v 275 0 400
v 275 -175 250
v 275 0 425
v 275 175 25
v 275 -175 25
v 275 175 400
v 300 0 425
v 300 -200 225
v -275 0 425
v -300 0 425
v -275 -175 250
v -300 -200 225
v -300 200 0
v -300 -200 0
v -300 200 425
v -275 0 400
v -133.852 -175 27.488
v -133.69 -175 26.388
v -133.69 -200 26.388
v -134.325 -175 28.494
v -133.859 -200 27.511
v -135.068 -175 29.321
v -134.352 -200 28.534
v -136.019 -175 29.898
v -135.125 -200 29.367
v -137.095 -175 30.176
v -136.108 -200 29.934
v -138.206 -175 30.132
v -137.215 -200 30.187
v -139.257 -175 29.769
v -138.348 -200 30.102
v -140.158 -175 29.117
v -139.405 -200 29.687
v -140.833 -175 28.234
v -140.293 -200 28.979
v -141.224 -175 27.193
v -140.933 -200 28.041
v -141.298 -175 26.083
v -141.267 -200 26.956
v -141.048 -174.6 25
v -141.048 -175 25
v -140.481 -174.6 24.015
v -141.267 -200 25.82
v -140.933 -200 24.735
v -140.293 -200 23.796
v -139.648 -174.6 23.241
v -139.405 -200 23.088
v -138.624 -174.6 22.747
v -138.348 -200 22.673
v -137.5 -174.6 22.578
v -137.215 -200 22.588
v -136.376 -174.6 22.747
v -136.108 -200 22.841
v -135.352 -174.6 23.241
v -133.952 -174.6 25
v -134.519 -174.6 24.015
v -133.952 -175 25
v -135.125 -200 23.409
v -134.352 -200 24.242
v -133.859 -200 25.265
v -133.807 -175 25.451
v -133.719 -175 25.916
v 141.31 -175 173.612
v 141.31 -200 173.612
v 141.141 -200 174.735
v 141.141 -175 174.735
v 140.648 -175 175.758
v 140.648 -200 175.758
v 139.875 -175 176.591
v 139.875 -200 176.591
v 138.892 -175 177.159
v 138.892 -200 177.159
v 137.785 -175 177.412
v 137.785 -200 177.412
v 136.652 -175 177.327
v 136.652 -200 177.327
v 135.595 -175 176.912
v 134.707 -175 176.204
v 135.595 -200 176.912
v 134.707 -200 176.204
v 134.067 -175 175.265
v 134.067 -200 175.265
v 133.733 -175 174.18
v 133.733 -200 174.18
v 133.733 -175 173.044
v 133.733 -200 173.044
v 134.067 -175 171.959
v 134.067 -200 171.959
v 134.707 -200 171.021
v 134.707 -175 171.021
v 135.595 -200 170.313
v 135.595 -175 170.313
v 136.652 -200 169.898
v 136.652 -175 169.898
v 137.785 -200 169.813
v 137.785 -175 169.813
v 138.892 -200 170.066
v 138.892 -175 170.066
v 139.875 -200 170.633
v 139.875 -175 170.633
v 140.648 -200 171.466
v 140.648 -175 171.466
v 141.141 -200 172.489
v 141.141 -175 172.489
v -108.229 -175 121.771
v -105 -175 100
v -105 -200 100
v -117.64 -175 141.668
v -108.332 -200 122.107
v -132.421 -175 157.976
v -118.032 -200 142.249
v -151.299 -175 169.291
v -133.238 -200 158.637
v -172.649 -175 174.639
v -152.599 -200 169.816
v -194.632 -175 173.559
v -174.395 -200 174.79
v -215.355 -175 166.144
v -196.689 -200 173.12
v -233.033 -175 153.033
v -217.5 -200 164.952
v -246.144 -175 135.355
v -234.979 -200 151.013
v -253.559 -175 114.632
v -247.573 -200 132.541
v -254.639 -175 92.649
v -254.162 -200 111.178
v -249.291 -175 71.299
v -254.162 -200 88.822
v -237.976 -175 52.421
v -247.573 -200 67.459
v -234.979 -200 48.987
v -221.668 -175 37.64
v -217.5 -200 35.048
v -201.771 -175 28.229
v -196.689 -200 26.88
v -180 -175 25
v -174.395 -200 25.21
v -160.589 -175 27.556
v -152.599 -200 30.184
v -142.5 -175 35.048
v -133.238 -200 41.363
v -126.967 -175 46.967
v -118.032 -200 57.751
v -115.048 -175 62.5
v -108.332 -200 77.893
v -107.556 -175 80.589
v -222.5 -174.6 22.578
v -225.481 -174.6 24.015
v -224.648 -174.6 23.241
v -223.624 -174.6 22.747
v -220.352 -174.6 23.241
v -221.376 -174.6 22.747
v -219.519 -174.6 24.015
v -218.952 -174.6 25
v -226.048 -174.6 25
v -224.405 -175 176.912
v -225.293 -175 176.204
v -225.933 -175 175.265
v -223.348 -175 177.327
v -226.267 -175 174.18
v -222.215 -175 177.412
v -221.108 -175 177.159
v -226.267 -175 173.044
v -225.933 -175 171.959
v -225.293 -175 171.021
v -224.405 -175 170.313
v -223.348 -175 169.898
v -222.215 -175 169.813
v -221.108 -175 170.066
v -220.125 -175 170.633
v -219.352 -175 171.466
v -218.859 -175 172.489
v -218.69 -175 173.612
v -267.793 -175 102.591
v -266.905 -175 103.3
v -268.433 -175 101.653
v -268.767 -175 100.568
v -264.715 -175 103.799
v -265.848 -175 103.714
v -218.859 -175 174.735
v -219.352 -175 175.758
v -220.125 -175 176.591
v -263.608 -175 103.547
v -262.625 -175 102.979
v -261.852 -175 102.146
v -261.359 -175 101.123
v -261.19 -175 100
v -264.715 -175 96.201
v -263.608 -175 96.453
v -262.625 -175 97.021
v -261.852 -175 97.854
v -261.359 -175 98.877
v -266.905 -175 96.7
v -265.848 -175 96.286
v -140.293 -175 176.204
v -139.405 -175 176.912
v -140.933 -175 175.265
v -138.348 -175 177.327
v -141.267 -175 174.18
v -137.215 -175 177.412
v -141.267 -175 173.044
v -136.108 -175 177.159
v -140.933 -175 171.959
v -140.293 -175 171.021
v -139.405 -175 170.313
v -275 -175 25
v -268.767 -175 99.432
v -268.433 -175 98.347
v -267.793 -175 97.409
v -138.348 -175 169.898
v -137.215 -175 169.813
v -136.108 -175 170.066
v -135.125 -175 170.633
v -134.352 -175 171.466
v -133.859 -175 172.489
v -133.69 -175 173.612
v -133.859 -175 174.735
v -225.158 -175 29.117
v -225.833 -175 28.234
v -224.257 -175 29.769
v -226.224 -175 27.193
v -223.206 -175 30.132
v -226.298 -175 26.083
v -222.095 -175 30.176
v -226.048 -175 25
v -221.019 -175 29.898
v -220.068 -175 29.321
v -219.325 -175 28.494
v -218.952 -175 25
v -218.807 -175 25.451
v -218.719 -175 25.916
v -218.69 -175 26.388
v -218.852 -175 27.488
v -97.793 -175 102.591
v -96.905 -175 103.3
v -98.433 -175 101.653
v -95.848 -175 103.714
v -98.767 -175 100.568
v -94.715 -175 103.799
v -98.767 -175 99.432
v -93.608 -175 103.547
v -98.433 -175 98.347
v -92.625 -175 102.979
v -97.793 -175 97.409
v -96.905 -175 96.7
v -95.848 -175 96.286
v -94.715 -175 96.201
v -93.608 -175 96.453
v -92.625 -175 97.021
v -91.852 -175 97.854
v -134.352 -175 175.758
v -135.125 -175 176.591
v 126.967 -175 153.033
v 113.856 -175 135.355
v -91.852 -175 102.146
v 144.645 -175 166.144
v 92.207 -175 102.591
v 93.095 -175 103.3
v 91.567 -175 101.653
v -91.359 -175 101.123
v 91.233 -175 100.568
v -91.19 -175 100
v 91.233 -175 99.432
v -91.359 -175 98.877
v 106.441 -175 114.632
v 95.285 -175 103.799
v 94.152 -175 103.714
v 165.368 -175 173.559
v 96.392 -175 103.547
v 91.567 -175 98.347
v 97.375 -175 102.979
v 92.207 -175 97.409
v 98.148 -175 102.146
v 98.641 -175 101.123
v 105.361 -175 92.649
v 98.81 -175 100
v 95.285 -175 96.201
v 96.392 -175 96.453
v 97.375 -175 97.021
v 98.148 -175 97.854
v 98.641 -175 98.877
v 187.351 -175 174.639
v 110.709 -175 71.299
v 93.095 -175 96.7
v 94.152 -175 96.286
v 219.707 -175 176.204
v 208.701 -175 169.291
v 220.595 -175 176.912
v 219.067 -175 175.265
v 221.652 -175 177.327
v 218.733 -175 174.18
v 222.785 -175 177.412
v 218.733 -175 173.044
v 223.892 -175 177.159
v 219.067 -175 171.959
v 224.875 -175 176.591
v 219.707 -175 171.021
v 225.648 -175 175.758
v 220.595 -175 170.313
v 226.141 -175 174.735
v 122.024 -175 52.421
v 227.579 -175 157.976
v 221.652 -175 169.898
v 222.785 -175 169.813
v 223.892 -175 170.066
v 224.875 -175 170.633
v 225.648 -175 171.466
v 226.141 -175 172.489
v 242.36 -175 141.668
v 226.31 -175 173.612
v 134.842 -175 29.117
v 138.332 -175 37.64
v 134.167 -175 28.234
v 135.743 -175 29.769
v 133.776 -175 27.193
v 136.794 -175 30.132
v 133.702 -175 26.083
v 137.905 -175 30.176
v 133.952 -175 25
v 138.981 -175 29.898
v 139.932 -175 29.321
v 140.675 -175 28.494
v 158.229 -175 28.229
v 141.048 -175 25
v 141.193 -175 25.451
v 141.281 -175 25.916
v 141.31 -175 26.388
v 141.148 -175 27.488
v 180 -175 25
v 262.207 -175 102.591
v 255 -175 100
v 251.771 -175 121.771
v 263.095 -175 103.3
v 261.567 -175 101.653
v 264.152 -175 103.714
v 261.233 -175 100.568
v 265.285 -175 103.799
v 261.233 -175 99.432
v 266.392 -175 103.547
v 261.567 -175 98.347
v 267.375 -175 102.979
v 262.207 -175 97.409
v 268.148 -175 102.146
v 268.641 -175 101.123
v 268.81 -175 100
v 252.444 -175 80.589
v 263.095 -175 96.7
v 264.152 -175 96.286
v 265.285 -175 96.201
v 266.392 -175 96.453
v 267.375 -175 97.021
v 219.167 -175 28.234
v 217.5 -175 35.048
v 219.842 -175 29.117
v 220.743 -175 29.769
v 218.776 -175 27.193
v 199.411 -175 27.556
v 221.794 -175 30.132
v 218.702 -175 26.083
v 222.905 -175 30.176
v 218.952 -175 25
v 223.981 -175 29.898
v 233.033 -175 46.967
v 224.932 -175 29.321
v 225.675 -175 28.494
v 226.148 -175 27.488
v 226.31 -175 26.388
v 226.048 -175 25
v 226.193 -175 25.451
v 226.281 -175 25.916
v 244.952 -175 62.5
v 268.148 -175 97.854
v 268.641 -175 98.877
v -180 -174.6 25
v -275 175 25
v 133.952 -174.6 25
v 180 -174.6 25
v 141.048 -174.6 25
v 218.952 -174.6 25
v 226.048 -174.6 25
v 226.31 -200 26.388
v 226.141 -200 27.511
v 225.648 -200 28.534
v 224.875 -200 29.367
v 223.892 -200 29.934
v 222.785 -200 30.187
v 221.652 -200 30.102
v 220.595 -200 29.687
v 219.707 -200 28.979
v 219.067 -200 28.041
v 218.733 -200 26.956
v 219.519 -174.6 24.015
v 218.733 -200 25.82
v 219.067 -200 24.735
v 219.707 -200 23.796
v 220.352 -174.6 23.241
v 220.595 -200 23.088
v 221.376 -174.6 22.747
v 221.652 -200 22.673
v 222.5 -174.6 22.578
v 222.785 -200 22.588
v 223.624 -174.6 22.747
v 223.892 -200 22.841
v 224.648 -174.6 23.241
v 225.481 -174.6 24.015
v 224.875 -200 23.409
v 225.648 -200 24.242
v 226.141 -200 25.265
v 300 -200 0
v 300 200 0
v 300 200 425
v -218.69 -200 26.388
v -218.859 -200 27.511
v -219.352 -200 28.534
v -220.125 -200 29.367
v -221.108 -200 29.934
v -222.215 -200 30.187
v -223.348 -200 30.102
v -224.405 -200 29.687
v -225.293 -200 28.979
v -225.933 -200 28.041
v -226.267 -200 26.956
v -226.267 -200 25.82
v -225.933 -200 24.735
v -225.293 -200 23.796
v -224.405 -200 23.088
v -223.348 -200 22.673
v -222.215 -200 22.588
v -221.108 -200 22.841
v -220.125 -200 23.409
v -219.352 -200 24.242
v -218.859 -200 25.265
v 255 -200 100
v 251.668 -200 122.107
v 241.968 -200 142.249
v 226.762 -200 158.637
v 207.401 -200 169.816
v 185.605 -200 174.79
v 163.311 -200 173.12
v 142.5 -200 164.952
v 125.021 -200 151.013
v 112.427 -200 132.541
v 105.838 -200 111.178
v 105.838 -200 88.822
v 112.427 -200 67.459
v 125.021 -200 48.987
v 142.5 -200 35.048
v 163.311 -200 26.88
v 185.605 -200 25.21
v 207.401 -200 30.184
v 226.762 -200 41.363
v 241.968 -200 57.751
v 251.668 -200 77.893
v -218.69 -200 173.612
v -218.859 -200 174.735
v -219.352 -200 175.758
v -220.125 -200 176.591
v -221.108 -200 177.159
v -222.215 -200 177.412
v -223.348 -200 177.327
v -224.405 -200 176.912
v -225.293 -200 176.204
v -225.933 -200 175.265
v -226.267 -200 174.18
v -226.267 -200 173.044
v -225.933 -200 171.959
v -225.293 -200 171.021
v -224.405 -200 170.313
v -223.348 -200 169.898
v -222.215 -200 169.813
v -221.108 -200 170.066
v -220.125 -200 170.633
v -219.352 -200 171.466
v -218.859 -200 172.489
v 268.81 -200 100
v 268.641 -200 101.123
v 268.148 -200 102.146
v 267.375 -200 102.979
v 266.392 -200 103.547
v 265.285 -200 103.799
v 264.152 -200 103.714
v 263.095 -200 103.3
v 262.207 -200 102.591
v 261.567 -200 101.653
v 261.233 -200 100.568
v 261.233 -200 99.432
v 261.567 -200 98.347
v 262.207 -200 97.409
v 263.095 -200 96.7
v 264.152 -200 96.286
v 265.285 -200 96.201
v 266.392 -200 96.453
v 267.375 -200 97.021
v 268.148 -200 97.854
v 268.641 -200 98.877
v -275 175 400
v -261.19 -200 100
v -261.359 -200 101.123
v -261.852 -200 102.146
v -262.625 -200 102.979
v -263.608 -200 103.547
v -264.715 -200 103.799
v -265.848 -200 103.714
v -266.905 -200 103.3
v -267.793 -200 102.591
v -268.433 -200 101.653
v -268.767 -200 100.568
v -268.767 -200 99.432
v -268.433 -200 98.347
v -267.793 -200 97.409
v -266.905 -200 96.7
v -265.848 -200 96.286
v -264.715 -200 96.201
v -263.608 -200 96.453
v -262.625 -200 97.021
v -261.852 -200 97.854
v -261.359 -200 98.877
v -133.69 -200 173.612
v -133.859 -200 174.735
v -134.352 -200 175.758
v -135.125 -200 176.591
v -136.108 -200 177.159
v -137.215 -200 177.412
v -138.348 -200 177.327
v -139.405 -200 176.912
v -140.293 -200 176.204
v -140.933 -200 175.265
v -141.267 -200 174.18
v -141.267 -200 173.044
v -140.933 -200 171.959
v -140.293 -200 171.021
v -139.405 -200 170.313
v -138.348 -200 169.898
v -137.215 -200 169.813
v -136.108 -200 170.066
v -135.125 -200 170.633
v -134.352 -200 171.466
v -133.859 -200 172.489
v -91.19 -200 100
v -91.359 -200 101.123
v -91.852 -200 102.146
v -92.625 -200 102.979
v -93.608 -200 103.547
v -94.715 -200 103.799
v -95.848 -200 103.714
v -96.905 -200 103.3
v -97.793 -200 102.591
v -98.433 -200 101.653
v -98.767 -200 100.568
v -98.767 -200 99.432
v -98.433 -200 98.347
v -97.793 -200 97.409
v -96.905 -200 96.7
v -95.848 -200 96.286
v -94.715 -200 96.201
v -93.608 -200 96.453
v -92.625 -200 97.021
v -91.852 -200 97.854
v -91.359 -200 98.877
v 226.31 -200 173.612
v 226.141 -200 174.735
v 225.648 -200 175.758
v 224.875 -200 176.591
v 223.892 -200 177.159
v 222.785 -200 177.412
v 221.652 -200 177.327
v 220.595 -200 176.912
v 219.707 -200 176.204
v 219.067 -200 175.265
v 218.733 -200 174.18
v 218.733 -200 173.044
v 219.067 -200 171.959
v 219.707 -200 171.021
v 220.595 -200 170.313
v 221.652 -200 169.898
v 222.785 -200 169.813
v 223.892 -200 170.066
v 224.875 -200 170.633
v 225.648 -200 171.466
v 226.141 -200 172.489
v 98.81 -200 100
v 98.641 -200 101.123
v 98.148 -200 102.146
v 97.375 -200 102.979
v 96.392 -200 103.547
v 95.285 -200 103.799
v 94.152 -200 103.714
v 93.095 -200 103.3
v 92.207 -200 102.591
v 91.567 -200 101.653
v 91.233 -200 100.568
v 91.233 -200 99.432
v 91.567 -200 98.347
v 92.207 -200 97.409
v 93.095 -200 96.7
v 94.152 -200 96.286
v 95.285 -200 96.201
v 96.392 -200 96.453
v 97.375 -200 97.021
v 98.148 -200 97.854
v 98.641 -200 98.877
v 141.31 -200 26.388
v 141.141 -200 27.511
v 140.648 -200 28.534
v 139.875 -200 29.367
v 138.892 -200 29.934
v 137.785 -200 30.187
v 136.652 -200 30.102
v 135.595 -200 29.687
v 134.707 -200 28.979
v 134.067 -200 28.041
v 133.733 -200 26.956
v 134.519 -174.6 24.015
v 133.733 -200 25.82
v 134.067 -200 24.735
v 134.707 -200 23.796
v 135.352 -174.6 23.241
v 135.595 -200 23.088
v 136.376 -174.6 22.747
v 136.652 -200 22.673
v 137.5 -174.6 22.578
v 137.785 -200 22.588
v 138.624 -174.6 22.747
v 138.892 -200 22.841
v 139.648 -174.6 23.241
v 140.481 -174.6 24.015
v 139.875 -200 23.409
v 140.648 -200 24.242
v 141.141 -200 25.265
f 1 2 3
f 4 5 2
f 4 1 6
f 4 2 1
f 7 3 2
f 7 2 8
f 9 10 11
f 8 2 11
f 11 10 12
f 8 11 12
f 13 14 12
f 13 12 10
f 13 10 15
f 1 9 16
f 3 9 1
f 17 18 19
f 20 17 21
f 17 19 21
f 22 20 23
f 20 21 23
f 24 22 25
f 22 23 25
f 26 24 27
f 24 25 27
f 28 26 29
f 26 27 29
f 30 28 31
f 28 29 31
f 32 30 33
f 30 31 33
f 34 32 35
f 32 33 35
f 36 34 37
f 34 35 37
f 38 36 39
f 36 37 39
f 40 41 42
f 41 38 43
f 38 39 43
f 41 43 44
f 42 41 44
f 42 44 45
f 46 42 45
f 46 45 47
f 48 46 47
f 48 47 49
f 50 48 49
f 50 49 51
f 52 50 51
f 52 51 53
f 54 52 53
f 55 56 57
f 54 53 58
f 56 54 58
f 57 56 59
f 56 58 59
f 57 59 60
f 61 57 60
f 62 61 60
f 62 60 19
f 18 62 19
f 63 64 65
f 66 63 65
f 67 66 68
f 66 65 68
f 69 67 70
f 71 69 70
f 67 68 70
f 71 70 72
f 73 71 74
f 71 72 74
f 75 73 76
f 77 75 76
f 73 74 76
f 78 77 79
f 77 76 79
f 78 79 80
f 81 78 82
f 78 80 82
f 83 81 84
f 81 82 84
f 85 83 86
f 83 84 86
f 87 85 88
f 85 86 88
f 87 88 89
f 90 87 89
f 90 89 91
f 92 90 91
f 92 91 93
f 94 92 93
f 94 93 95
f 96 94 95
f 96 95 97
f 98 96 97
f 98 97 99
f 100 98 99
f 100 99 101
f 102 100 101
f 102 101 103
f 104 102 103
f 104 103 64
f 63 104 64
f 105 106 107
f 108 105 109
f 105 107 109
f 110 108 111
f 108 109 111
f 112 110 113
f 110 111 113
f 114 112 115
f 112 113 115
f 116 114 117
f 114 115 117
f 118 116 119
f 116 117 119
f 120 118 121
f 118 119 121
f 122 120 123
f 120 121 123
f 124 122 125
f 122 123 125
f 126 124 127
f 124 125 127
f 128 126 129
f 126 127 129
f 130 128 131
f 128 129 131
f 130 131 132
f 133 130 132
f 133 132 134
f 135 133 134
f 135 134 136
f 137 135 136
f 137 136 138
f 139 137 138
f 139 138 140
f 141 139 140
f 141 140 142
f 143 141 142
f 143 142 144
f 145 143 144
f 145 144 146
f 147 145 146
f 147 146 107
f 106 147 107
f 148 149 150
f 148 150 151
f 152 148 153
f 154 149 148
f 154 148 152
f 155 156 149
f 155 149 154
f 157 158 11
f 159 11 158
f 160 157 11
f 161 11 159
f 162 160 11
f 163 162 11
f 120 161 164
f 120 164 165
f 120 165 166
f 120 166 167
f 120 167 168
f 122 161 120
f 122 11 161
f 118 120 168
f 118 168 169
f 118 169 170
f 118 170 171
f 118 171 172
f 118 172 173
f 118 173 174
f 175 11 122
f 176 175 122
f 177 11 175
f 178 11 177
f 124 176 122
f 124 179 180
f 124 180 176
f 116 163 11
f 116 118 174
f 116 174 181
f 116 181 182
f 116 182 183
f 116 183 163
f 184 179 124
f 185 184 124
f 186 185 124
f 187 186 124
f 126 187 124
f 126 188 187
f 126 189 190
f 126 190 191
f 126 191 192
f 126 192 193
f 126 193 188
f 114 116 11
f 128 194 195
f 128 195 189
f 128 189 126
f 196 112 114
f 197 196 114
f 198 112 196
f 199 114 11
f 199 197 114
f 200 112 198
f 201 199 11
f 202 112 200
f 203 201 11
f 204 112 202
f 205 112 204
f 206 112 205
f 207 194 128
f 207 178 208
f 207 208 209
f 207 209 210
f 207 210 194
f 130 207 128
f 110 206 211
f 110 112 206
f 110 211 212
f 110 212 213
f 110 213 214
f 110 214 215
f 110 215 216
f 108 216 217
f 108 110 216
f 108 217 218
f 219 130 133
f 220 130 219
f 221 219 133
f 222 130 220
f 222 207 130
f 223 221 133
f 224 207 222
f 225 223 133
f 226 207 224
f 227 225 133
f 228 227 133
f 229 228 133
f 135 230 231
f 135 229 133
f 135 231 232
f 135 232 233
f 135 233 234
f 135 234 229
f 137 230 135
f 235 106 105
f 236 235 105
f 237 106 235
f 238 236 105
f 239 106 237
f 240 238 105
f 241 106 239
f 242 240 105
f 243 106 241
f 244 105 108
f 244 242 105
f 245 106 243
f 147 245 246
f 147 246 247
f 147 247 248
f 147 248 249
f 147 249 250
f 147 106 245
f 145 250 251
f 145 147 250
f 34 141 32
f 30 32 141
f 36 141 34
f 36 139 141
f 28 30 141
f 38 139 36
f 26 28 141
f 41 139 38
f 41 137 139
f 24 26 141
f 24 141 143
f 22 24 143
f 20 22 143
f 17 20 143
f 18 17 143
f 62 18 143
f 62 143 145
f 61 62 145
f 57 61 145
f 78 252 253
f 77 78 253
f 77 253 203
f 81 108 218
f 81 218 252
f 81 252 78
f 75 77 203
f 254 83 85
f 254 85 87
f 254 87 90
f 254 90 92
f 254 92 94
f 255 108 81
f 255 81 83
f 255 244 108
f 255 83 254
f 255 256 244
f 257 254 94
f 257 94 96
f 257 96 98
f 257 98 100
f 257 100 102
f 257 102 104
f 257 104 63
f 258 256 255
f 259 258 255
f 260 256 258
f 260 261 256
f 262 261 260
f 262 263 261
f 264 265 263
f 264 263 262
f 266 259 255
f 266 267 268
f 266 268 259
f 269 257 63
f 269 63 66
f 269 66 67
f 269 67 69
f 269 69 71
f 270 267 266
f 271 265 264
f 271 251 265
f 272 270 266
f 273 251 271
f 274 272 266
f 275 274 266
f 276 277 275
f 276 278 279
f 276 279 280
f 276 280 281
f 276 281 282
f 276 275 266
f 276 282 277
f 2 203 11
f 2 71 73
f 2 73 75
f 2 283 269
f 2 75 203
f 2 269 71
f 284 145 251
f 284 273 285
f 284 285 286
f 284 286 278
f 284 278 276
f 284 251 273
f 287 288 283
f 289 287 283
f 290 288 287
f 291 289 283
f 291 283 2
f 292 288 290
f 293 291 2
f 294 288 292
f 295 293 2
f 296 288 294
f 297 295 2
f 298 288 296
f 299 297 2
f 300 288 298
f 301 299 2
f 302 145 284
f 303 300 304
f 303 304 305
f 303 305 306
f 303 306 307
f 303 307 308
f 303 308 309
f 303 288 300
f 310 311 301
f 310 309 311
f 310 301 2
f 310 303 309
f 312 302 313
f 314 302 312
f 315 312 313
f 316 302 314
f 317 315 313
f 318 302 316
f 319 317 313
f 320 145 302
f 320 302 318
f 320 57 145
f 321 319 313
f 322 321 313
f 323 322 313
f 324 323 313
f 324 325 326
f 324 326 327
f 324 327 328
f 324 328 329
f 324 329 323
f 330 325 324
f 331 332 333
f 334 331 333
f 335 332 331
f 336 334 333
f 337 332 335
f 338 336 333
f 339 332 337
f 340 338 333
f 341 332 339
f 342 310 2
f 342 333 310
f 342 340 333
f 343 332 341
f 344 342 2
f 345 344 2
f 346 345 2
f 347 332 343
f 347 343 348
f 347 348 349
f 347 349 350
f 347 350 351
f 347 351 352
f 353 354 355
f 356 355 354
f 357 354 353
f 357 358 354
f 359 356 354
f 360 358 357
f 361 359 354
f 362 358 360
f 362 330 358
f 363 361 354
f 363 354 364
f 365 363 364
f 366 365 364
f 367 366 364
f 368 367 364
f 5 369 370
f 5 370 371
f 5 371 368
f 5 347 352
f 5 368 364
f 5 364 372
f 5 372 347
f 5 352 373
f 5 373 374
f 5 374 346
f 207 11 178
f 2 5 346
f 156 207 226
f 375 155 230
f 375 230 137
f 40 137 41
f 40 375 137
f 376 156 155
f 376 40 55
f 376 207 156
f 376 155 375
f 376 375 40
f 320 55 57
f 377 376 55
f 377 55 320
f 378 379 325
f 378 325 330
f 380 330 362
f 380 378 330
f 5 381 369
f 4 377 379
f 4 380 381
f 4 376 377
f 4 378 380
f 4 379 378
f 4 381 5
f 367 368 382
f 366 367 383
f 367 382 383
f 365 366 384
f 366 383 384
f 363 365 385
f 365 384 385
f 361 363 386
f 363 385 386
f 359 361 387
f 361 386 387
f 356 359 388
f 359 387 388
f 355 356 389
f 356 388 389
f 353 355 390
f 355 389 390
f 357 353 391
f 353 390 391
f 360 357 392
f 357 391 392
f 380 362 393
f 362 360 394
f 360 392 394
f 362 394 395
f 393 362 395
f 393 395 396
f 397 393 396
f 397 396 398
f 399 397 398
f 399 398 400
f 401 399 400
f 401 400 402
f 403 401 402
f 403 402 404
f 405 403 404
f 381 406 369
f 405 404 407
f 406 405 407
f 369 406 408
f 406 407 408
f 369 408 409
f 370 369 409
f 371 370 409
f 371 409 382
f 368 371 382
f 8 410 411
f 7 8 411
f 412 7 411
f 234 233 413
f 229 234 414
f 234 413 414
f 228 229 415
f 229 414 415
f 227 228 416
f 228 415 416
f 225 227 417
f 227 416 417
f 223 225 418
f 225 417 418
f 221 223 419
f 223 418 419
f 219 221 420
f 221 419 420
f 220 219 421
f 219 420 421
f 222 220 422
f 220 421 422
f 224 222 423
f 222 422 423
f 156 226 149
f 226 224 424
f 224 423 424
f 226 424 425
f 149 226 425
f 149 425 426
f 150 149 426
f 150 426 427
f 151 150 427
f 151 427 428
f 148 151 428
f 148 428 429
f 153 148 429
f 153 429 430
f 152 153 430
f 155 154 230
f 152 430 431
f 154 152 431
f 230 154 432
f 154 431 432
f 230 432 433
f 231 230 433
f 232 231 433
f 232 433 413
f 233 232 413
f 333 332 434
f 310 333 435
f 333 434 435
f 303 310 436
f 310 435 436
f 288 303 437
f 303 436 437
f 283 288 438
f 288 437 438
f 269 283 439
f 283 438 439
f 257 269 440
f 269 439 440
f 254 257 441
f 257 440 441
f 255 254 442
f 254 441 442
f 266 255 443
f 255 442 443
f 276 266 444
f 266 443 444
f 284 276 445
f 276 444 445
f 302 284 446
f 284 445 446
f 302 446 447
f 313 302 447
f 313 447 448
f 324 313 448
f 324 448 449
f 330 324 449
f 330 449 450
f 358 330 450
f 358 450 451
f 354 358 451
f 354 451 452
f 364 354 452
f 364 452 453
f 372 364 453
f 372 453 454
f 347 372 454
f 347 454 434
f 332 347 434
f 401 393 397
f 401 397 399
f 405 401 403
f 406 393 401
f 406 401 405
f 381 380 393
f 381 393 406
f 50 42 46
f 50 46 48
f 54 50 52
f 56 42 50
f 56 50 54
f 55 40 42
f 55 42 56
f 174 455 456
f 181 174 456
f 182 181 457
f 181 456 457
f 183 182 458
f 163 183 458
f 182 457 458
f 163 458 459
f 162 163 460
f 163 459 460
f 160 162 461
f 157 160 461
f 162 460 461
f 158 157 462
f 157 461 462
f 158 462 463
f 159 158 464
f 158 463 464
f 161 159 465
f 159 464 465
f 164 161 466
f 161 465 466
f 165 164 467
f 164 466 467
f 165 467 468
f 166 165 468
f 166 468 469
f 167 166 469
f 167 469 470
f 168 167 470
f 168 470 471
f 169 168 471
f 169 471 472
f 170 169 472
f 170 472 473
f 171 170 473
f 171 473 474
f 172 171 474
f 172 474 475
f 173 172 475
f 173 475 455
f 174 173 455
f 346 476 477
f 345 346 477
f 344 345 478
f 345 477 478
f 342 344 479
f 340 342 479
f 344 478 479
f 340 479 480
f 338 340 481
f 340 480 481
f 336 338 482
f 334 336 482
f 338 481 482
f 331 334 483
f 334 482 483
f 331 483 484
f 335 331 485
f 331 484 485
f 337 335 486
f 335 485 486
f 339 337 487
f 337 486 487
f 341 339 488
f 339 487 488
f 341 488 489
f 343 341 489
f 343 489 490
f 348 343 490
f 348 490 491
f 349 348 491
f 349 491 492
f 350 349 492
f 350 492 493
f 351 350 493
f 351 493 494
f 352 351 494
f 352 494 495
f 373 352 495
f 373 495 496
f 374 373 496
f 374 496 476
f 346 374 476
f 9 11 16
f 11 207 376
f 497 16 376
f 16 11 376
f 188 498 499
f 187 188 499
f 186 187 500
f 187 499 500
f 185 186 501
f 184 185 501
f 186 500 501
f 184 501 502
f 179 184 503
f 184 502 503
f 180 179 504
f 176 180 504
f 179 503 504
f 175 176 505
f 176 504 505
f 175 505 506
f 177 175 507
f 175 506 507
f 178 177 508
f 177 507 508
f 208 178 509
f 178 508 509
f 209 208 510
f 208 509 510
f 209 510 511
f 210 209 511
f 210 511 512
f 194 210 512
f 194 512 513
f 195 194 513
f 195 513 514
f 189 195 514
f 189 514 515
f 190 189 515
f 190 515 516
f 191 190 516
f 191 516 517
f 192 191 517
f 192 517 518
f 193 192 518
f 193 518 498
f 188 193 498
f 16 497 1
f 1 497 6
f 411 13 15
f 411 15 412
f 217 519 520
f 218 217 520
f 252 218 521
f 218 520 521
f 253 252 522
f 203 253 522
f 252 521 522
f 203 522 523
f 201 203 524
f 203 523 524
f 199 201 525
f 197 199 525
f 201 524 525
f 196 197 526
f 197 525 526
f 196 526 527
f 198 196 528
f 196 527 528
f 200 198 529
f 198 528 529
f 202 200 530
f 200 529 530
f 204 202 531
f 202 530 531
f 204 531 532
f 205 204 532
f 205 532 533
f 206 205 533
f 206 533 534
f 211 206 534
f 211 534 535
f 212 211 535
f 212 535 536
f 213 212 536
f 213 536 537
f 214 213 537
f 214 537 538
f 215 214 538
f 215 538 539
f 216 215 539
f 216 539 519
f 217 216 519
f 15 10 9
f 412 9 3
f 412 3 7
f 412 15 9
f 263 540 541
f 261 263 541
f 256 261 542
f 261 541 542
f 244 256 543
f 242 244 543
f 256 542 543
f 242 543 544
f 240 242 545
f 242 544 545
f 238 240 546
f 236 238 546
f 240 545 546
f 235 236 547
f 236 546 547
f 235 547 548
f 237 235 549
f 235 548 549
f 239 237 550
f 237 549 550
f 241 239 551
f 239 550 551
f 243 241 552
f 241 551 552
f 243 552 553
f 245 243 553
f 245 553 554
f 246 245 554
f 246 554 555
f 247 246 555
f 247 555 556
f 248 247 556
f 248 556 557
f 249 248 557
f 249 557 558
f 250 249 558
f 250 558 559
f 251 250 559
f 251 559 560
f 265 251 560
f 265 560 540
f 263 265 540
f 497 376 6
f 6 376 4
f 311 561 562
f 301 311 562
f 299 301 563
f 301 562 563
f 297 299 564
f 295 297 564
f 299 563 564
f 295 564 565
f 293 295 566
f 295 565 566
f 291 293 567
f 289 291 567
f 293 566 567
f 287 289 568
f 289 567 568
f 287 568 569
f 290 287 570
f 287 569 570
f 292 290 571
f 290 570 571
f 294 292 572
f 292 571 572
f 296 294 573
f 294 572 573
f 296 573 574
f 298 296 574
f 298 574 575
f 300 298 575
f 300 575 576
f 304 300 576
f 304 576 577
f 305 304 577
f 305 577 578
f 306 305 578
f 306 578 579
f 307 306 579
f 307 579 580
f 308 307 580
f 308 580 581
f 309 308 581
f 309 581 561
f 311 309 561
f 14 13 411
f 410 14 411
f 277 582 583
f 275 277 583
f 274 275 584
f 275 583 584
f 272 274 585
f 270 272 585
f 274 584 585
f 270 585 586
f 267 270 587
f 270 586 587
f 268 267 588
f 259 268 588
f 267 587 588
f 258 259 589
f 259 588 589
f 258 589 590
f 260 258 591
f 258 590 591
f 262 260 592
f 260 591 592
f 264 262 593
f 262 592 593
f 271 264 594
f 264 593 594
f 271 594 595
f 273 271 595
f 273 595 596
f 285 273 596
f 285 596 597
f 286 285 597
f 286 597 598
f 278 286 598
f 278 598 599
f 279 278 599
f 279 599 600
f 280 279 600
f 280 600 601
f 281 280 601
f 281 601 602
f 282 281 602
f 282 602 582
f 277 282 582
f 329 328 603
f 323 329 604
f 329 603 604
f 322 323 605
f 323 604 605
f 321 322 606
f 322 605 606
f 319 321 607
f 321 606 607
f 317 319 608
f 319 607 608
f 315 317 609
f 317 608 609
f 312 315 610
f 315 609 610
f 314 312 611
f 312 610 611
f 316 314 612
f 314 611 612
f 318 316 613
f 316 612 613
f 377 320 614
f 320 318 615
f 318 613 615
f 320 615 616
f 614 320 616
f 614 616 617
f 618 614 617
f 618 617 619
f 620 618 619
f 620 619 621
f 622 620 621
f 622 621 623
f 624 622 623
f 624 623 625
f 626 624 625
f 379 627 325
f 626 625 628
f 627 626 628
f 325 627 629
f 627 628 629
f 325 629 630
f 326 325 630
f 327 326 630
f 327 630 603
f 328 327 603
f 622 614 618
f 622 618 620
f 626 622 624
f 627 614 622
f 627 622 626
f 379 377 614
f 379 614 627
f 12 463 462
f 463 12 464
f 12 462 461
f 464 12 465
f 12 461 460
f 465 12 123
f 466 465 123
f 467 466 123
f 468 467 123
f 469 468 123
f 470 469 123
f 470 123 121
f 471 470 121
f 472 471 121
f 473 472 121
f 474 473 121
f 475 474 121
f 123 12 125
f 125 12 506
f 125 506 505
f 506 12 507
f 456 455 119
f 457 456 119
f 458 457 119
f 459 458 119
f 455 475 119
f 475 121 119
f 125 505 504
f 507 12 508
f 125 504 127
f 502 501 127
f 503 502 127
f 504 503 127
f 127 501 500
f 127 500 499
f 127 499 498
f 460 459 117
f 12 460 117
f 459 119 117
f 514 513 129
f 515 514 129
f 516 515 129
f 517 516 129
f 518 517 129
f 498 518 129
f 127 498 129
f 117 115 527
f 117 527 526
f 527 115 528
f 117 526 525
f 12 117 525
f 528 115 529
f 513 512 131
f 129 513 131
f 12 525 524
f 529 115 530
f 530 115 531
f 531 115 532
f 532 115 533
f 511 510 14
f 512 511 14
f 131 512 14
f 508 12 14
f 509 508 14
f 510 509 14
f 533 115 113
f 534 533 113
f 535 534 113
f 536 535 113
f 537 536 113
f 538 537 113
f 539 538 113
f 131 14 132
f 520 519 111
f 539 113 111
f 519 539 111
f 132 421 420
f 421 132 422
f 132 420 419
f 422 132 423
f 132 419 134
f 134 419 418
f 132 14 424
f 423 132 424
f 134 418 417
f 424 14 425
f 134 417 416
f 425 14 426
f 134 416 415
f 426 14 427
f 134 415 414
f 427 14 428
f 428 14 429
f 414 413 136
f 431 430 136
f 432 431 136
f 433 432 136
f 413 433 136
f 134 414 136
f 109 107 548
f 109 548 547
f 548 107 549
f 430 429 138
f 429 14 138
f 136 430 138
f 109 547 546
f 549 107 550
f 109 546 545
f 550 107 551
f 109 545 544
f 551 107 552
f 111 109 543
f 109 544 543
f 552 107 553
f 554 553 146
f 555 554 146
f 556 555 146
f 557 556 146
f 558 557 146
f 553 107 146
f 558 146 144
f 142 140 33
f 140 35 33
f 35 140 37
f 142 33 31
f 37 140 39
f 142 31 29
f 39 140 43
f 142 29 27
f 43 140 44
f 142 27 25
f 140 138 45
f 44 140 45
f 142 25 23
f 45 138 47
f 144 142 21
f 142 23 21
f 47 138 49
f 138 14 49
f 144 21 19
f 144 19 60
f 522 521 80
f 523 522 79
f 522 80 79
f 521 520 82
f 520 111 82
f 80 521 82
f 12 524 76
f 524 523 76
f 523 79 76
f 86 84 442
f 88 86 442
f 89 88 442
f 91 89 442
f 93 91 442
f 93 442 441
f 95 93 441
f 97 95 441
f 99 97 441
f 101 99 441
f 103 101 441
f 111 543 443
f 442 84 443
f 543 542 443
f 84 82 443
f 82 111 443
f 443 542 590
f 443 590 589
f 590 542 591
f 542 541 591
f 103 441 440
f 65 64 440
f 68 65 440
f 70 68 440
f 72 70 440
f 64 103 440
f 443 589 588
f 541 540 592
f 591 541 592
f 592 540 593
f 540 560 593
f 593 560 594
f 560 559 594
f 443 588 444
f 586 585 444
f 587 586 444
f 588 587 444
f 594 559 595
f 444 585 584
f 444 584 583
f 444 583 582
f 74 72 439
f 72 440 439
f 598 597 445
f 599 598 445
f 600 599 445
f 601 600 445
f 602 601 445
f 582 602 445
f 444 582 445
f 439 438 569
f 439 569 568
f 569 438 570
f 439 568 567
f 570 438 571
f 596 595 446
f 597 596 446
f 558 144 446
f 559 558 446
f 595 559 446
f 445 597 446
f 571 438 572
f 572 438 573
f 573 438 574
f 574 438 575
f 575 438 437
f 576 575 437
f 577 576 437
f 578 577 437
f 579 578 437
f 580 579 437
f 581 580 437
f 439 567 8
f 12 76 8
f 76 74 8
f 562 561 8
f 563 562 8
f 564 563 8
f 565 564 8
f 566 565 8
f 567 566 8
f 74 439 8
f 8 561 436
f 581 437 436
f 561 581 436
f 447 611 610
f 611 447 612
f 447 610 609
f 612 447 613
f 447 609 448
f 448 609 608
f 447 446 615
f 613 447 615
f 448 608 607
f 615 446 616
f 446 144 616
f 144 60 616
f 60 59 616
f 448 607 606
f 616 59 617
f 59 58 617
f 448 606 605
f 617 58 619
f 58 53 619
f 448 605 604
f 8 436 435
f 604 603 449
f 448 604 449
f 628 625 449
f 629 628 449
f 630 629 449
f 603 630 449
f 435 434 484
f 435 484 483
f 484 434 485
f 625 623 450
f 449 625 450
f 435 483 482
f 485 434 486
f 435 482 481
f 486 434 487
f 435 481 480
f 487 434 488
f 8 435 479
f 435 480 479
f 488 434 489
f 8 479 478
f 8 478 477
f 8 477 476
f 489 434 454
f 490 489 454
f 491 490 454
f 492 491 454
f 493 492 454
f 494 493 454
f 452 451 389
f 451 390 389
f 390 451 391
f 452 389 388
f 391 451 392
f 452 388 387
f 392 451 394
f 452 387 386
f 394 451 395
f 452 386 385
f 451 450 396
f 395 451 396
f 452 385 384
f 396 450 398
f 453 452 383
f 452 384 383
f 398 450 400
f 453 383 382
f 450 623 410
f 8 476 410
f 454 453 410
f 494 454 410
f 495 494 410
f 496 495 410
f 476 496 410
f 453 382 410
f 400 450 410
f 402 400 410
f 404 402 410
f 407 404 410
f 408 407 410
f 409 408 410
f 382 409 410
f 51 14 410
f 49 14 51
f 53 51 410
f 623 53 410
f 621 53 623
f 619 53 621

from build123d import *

# Parameters (mm, degrees)
F0_W      = 600
F0_H      = 400
F1_DEPTH  = 25
F2_W      = 600
F2_H      = 400
F2_W_2    = 550
F2_H_2    = 350
F3_DEPTH  = 400
F5_DEPTH  = 600.001
F6_W      = 600
F6_H      = 200
F7_DEPTH  = 25
F8_R      = 75
F8_R_2    = 3.81
F9_DEPTH  = 25.4
F10_DEPTH = 25.4


with BuildPart() as f1:
    # F0 (on Top) → F1 (new body)
    with BuildSketch(Plane.XY):
        Rectangle(F0_W, F0_H)
    extrude(amount=F1_DEPTH)

    # F2 (on face) → F3 (join)
    with BuildSketch(Plane.XY.offset(25)):
        Rectangle(F2_W, F2_H)
        Rectangle(F2_W_2, F2_H_2, mode=Mode.SUBTRACT)
    extrude(amount=F3_DEPTH)

    # F4 (on face) → F5 (cut, through all)
    with BuildSketch(Plane(origin=(-300, 0, 0), x_dir=(0, -1, 0), z_dir=(-1, 0, 0))):
        Polygon((200, 225), (200, 425), (0, 425), align=None)
    extrude(amount=-F5_DEPTH, mode=Mode.SUBTRACT)

    # F6 (on face) → F7 (join)
    with BuildSketch(Plane.XY.offset(425)):
        with Locations((0, 100)):
            Rectangle(F6_W, F6_H)
    extrude(amount=-F7_DEPTH)

    # F8 (on face) → F9 (cut)
    with BuildSketch(Plane.XZ.offset(200)):
        with Locations((-180, 100)):
            Circle(F8_R)
        with Locations((180, 100)):
            Circle(F8_R)
        with Locations((-95, 100)):
            Circle(F8_R_2)
        with Locations((-137.5, 173.612159)):
            Circle(F8_R_2)
        with Locations((-222.5, 173.612159)):
            Circle(F8_R_2)
        with Locations((-265, 100)):
            Circle(F8_R_2)
        with Locations((-222.5, 26.387841)):
            Circle(F8_R_2)
        with Locations((-137.5, 26.387841)):
            Circle(F8_R_2)
        with Locations((95, 100)):
            Circle(F8_R_2)
        with Locations((137.5, 26.387841)):
            Circle(F8_R_2)
        with Locations((222.5, 26.387841)):
            Circle(F8_R_2)
        with Locations((265, 100)):
            Circle(F8_R_2)
        with Locations((222.5, 173.612159)):
            Circle(F8_R_2)
        with Locations((137.5, 173.612159)):
            Circle(F8_R_2)
    extrude(amount=-F9_DEPTH, mode=Mode.SUBTRACT)

    # F8 (on face) → F10 (cut)
    with BuildSketch(Plane.XZ.offset(200)):
        with Locations((-180, 100)):
            Circle(F8_R)
        with Locations((180, 100)):
            Circle(F8_R)
        with Locations((-95, 100)):
            Circle(F8_R_2)
        with Locations((-137.5, 173.612159)):
            Circle(F8_R_2)
        with Locations((-222.5, 173.612159)):
            Circle(F8_R_2)
        with Locations((-265, 100)):
            Circle(F8_R_2)
        with Locations((-222.5, 26.387841)):
            Circle(F8_R_2)
        with Locations((-137.5, 26.387841)):
            Circle(F8_R_2)
        with Locations((95, 100)):
            Circle(F8_R_2)
        with Locations((137.5, 26.387841)):
            Circle(F8_R_2)
        with Locations((222.5, 26.387841)):
            Circle(F8_R_2)
        with Locations((265, 100)):
            Circle(F8_R_2)
        with Locations((222.5, 173.612159)):
            Circle(F8_R_2)
        with Locations((137.5, 173.612159)):
            Circle(F8_R_2)
    extrude(amount=-F10_DEPTH, mode=Mode.SUBTRACT)


solid = f1.part
